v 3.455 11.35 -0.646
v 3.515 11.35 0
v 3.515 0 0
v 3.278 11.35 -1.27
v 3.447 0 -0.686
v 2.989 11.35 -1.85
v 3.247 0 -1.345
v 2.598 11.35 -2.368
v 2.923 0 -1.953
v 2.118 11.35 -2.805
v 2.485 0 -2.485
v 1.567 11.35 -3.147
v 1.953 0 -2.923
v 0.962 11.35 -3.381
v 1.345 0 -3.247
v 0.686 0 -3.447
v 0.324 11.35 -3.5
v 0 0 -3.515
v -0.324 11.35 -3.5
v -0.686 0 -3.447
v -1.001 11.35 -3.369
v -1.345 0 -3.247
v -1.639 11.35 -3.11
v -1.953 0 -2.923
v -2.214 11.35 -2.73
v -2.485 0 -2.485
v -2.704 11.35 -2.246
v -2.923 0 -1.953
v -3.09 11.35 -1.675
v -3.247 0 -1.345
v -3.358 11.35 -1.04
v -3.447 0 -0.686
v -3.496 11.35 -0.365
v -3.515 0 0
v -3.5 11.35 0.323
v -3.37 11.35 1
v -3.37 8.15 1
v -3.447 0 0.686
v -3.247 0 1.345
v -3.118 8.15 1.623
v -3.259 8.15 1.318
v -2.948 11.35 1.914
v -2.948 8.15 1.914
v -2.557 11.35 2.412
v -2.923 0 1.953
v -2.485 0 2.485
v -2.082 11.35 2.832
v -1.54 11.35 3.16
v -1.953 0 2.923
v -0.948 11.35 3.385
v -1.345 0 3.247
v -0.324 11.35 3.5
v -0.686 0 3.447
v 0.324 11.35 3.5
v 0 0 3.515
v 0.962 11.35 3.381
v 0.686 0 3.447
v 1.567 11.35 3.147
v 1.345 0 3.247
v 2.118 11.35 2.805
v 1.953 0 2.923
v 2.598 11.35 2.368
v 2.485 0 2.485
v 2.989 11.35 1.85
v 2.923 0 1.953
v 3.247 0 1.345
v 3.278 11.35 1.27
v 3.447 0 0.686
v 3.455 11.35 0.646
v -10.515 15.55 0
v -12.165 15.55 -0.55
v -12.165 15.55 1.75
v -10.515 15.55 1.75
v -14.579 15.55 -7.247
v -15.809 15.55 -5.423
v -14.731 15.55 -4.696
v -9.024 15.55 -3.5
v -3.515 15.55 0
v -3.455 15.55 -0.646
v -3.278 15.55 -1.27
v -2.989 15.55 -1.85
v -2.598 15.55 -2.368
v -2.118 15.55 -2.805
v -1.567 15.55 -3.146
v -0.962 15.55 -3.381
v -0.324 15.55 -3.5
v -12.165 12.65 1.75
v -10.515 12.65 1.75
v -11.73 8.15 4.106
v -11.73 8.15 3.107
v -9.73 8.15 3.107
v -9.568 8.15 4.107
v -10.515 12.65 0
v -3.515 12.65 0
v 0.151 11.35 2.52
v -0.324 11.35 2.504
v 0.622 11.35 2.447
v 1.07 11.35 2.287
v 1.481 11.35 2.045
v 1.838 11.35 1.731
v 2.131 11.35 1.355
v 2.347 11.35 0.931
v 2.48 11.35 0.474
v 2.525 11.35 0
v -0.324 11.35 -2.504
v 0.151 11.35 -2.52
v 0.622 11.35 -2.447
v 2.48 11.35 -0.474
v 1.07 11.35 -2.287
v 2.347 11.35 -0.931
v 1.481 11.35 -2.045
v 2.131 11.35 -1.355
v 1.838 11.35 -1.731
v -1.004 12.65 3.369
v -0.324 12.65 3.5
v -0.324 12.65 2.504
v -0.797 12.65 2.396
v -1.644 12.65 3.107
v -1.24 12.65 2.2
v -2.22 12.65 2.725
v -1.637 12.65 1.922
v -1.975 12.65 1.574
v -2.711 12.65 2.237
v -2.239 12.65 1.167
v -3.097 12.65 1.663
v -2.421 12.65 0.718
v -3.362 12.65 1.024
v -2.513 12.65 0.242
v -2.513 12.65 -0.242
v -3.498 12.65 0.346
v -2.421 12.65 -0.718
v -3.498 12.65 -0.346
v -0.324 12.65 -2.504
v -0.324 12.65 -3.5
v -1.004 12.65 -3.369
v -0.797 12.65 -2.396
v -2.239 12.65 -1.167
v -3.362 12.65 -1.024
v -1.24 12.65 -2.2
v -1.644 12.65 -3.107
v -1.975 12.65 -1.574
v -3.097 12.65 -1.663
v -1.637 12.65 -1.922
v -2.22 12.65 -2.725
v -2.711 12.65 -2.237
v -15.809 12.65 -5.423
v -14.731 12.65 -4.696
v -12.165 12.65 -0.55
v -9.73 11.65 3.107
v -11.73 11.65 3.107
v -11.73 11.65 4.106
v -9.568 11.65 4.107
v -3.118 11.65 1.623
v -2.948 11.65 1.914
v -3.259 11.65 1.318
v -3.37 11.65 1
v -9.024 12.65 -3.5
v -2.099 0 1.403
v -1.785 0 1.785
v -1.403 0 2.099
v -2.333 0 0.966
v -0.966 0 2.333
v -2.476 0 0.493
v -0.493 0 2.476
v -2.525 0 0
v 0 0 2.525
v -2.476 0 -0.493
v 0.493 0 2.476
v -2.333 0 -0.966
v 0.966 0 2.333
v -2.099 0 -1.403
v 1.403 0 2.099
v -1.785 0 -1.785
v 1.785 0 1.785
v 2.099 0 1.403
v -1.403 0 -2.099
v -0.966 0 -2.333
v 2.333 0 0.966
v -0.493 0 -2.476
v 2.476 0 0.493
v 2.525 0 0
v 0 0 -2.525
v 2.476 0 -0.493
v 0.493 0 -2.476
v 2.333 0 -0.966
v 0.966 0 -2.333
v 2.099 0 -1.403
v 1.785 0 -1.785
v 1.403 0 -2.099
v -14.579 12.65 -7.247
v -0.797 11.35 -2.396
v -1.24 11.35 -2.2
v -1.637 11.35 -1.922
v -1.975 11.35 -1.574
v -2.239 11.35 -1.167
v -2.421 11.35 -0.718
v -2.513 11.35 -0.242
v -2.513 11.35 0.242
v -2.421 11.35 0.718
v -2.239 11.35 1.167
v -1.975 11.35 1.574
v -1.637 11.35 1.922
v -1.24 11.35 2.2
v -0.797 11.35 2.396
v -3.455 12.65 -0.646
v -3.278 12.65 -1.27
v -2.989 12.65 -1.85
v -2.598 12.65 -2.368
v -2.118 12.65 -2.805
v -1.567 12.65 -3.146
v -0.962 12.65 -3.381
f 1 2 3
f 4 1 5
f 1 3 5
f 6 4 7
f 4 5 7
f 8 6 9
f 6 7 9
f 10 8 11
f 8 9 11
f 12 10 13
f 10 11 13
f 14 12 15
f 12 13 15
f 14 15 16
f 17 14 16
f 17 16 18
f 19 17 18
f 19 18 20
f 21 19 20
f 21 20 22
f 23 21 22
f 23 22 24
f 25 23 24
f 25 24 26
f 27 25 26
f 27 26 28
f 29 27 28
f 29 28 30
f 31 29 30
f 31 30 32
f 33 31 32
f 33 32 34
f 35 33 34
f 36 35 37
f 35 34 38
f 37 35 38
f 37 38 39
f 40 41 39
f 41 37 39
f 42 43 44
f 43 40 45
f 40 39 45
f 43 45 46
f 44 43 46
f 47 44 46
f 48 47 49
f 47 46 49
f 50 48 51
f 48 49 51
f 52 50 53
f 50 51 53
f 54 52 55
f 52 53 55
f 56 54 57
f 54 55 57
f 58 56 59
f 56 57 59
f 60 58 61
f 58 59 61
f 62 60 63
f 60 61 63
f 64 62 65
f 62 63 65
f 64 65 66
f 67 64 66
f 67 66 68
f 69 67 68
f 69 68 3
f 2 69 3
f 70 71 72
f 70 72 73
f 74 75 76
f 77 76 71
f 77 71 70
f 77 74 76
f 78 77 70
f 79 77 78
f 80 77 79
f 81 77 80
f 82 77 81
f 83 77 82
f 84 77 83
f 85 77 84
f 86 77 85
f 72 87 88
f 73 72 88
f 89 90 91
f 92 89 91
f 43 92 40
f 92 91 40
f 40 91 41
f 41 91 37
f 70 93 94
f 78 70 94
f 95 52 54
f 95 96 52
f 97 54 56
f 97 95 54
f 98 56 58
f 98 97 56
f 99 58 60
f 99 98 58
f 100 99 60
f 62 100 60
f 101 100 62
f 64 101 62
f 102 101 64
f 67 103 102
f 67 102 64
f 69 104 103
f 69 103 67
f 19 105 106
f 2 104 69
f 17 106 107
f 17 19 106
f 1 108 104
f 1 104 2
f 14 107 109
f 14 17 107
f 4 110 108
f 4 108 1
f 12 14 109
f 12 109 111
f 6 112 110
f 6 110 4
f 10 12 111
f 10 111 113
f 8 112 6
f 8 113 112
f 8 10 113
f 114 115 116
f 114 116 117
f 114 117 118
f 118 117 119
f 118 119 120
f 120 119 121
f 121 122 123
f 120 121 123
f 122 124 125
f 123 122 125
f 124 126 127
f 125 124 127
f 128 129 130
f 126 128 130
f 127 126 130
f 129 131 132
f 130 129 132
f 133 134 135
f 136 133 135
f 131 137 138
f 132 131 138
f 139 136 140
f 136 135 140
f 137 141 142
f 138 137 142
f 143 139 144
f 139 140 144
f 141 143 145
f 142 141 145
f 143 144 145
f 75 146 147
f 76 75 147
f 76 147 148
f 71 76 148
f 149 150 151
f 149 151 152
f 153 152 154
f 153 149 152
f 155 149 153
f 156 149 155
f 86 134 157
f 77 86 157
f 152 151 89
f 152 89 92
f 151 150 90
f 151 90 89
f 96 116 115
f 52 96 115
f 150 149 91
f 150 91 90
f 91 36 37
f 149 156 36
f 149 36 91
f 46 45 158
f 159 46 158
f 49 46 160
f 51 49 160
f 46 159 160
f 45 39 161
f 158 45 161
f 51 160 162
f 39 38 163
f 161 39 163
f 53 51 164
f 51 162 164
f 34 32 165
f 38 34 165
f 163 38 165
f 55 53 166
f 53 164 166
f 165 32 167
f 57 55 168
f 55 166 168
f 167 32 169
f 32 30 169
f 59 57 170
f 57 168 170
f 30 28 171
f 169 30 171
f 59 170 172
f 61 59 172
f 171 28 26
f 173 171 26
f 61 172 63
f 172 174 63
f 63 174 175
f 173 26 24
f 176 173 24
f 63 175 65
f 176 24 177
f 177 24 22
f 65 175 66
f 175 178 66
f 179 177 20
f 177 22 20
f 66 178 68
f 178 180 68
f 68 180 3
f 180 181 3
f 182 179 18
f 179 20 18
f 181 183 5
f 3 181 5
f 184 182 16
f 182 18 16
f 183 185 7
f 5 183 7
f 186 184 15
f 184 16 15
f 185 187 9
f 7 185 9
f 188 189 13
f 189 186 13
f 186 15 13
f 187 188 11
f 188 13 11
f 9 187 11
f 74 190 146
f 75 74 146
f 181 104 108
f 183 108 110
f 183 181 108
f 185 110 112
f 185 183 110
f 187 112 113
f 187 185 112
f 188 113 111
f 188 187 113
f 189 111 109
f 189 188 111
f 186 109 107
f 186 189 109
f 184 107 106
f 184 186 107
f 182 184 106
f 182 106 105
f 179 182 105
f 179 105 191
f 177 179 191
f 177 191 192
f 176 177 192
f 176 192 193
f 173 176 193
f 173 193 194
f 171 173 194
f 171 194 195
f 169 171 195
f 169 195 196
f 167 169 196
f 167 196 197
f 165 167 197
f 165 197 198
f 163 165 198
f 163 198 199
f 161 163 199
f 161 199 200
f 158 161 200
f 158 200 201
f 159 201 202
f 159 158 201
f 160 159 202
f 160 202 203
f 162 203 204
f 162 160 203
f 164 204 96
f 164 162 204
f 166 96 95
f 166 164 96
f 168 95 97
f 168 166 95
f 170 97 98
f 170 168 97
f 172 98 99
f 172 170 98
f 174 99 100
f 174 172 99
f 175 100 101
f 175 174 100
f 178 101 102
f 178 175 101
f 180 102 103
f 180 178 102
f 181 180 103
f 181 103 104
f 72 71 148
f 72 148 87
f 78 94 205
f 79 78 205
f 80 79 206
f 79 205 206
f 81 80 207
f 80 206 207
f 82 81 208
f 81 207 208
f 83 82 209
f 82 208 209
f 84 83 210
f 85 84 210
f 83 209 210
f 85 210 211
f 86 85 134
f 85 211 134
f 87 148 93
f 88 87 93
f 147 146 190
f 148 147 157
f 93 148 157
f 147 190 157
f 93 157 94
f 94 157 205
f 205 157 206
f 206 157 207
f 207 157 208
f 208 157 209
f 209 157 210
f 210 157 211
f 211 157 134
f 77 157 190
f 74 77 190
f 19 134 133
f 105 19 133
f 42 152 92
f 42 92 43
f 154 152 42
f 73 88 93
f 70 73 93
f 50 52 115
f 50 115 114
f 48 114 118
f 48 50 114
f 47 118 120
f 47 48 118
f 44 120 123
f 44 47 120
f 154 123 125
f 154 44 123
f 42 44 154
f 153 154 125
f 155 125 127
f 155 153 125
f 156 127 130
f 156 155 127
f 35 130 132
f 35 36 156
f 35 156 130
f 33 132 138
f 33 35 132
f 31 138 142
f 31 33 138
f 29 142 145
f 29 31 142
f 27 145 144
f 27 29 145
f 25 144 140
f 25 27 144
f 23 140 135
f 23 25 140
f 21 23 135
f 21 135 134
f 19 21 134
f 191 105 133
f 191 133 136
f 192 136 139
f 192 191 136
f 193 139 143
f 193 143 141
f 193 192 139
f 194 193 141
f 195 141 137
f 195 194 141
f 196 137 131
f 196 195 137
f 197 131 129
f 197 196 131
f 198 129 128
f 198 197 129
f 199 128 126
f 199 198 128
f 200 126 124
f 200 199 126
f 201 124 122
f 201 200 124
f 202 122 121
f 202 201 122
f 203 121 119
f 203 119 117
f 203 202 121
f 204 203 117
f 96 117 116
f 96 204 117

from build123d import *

# Parameters (mm, degrees)
SKETCH1_R           = 3.515
SKETCH1_R_2         = 2.525
BOSS_EXTRUDE1_DEPTH = 11.35
BOSS_EXTRUDE2_DEPTH = 1.3
BOSS_EXTRUDE3_DEPTH = 2.9
BOSS_EXTRUDE4_DEPTH = 3.5


with BuildPart() as part:
    # Sketch1 → Boss-Extrude1 (new body)
    with BuildSketch(Plane(origin=(0, 0, 0), x_dir=(1, 0, 0), z_dir=(0, 1, 0))):
        Circle(SKETCH1_R)
        Circle(SKETCH1_R_2, mode=Mode.SUBTRACT)
    extrude(amount=BOSS_EXTRUDE1_DEPTH)

    # Sketch2 → Boss-Extrude2 (add)
    with BuildSketch(Plane(origin=(0, 11.35, 0), x_dir=(1, 0, 0), z_dir=(0, 1, 0))):
        with BuildLine():
            Line((-0.324384032, 3.5), (-0.324384032, 2.504076676))
            ThreePointArc((-0.324384032, 2.504076676), (-2.525, 0), (-0.324384032, -2.504076676))
            Line((-0.324384032, -2.504076676), (-0.324384032, -3.5))
            ThreePointArc((-0.324384032, -3.5), (-3.515, 0), (-0.324384032, 3.5))
        make_face()
    extrude(amount=BOSS_EXTRUDE2_DEPTH)

    # Sketch6 → Boss-Extrude4 (add)
    with BuildSketch(Plane(origin=(0, 11.65, 0), x_dir=(1, 0, 0), z_dir=(0, 1, 0))):
        with BuildLine():
            Line((-3.369751475, -1), (-9.729692569, -3.107403444))
            Line((-9.729692569, -3.107403444), (-11.729692569, -3.107403444))
            Line((-11.729692569, -3.107403444), (-11.729692569, -4.105940644))
            Line((-11.729692569, -4.105940644), (-9.568328637, -4.107403444))
            Line((-9.568328637, -4.107403444), (-2.948307108, -1.913820837))
            ThreePointArc((-2.948307108, -1.913820837), (-3.191901188, -1.472070584), (-3.369751475, -1))
        make_face()
    extrude(amount=-BOSS_EXTRUDE4_DEPTH)


with BuildPart() as body_2:
    # Sketch3 → Boss-Extrude3 (new body)
    with BuildSketch(Plane(origin=(0, 12.65, 0), x_dir=(1, 0, 0), z_dir=(0, 1, 0))):
        with BuildLine():
            Line((-0.324384032, 3.5), (-9.024384032, 3.5))
            Line((-9.024384032, 3.5), (-14.578935768, 7.246592453))
            Line((-14.578935768, 7.246592453), (-15.809160155, 5.422709794))
            Line((-15.809160155, 5.422709794), (-14.731411311, 4.695759019))
            Line((-14.731411311, 4.695759019), (-12.165, 0.55))
            Line((-12.165, 0.55), (-12.165, -1.75))
            Line((-12.165, -1.75), (-10.515, -1.75))
            Line((-10.515, -1.75), (-10.515, 0))
            Line((-10.515, 0), (-3.515, 0))
            ThreePointArc((-3.515, 0), (-2.597636894, 2.368017644), (-0.324384032, 3.5))
        make_face()
    extrude(amount=BOSS_EXTRUDE3_DEPTH)


solid = Compound([part.part, body_2.part])
